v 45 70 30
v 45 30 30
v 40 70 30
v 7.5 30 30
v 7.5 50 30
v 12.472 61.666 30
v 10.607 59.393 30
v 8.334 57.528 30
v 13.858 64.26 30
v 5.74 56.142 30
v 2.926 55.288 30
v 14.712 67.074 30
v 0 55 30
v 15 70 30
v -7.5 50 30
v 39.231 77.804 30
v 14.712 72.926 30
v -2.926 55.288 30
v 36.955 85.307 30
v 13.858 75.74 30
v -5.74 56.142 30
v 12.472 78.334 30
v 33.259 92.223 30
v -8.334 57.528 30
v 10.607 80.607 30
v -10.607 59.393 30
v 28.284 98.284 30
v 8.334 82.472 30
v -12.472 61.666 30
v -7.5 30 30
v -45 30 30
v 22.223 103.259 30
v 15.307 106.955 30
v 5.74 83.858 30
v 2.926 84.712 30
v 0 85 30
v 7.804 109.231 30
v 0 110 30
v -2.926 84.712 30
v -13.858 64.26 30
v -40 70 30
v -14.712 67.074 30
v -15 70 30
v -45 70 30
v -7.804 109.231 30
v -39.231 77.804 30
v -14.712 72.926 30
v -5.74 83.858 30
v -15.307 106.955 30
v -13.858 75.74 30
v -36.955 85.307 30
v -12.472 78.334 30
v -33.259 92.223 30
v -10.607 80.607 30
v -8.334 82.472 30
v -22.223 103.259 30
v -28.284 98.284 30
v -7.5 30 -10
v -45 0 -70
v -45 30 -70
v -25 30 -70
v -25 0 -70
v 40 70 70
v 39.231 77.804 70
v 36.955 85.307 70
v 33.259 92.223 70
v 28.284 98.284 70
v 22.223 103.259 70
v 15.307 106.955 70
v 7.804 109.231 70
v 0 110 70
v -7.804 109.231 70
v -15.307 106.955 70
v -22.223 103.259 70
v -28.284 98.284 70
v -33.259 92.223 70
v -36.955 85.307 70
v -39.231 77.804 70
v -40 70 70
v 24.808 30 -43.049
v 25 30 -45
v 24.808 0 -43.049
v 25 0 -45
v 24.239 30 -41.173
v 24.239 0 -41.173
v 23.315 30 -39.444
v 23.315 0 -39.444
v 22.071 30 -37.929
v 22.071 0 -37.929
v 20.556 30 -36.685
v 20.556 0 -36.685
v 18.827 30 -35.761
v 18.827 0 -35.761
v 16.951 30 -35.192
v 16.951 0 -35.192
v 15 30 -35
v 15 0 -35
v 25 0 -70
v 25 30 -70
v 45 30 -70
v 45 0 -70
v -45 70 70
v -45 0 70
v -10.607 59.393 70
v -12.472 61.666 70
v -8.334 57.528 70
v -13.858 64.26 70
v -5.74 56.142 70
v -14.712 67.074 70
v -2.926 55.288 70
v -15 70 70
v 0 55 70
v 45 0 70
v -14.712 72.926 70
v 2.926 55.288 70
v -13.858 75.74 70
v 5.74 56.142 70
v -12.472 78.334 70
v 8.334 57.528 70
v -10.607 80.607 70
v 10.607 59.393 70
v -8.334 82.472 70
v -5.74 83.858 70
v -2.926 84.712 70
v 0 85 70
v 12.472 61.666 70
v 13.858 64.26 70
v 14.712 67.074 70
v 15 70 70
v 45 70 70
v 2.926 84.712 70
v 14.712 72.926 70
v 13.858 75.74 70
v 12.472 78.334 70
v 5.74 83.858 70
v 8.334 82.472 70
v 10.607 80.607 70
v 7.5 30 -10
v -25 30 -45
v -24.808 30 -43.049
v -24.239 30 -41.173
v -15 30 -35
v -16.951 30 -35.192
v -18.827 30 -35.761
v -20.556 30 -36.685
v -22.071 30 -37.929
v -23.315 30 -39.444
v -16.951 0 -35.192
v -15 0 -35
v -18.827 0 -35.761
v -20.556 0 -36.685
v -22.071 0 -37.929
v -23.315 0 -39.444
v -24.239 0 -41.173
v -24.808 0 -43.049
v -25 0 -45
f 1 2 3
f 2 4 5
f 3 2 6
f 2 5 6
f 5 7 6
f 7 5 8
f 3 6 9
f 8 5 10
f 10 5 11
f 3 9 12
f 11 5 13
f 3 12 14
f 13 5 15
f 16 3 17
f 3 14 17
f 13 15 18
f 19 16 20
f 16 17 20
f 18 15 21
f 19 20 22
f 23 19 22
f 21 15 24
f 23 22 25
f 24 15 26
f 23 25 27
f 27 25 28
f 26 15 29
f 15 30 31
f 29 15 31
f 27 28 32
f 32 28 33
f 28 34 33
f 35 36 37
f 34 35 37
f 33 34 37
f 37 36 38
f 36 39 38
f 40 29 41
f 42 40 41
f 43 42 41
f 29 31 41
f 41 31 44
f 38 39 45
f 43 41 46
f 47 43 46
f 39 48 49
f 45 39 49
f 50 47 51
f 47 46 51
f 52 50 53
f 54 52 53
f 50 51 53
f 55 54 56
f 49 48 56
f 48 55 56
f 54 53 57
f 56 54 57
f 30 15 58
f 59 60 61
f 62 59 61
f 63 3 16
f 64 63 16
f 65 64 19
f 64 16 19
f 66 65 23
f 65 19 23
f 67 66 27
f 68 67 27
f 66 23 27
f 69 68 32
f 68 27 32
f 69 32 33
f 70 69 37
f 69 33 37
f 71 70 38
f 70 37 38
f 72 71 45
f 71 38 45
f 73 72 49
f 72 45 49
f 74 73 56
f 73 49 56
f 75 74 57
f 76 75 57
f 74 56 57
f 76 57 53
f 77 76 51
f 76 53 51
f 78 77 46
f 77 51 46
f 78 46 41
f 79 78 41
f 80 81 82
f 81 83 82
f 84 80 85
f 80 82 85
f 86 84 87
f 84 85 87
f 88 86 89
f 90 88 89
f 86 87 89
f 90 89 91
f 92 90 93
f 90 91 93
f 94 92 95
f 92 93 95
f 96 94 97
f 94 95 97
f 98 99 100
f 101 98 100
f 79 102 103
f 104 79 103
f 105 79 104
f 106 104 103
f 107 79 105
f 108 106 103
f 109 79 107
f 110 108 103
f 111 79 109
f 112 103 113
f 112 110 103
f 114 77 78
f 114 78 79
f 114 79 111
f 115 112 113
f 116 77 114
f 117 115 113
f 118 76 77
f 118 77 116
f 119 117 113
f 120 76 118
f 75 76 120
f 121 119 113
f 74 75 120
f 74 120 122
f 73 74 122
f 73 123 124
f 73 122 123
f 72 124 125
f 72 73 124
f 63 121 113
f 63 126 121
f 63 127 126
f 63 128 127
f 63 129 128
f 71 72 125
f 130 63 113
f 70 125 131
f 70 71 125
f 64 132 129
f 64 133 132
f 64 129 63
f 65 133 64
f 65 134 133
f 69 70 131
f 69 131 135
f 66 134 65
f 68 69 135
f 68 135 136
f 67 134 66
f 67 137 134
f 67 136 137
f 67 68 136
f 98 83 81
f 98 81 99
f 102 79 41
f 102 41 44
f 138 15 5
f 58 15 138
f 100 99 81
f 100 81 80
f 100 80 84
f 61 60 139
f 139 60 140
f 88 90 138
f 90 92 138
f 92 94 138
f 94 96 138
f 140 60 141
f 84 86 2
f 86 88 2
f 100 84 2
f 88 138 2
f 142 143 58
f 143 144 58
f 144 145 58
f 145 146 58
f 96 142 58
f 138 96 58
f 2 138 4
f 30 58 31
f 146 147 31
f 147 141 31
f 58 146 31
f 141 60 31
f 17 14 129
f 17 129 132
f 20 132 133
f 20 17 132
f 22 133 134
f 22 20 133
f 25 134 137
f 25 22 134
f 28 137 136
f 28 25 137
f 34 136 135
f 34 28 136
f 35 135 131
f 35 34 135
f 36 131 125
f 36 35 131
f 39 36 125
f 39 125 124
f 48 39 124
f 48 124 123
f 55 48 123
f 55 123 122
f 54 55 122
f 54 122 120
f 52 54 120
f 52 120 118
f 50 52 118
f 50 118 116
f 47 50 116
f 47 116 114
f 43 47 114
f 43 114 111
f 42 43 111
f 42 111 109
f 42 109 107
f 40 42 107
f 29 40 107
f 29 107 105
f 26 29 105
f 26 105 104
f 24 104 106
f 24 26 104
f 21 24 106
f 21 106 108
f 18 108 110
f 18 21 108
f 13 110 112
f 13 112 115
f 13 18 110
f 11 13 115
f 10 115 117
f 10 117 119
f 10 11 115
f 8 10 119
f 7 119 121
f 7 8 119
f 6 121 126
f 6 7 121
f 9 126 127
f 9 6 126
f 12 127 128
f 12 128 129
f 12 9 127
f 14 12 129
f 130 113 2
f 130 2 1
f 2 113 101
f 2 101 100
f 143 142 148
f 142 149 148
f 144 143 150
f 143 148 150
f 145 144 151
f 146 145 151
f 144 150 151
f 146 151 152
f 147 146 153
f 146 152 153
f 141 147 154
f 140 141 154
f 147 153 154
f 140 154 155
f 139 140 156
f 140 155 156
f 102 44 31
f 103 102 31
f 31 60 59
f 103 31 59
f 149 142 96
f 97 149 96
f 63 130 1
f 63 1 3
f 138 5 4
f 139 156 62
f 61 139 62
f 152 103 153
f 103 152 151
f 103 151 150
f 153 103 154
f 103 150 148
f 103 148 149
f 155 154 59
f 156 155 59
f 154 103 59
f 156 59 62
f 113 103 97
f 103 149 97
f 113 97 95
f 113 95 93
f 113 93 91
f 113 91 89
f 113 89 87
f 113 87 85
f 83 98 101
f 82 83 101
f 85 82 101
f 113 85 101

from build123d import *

# Parameters (mm, degrees)
BOSS_EXTRUDE1_DEPTH      = 70
BOSS_EXTRUDE1_DEPTH_BACK = 70
SKETCH1_R                = 15
SKETCH2_W                = 100
SKETCH2_H                = 80
CUT_EXTRUDE1_DEPTH       = 159.429795178
SKETCH3_W                = 50
SKETCH3_H                = 35
CUT_EXTRUDE2_DEPTH       = 116.433963806
FILLET1_R                = 10
RIB1_REACH               = 139.931
SKETCH4_WALL_W           = 322.583644032
SKETCH4_WALL_H           = 15


with BuildPart() as part:
    # Sketch1 → Boss-Extrude1 (new, two sides: drawn at the far end of the back side and taken through both)
    with BuildSketch(Plane.XY.offset(-BOSS_EXTRUDE1_DEPTH_BACK)):
        with BuildLine():
            Line((-40, 70), (-45, 70))
            Line((-45, 70), (-45, 0))
            Line((-45, 0), (45, 0))
            Line((45, 0), (45, 70))
            Line((45, 70), (40, 70))
            ThreePointArc((40, 70), (0, 110), (-40, 70))
        make_face()
        with Locations((0, 70)):
            Circle(SKETCH1_R, mode=Mode.SUBTRACT)
    extrude(amount=BOSS_EXTRUDE1_DEPTH + BOSS_EXTRUDE1_DEPTH_BACK)

    # Sketch2 → Cut-Extrude1 (cut, through all)
    with BuildSketch(Plane.ZY.offset(45)):
        with Locations((-20, 70)):
            Rectangle(SKETCH2_W, SKETCH2_H)
    extrude(amount=-CUT_EXTRUDE1_DEPTH, mode=Mode.SUBTRACT)

    # Sketch3 → Cut-Extrude2 (cut, through all)
    with BuildSketch(Plane(origin=(0, 30, 0), x_dir=(1, 0, 0), z_dir=(0, 1, 0))):
        with Locations((0, 52.5)):
            Rectangle(SKETCH3_W, SKETCH3_H)
    extrude(amount=-CUT_EXTRUDE2_DEPTH, mode=Mode.SUBTRACT)

    # Fillet1
    fillet1_edges = [part.edges().sort_by_distance(p)[0] for p in [
        (-25, 15, -35),
        (25, 15, -35),
    ]]
    fillet(fillet1_edges, radius=FILLET1_R)

    # Sketch4 wall → Rib1 (add, up to next)
    with BuildSketch(Plane(origin=(0, 40, 10), x_dir=(0, -0.4472135955, -0.894427191), z_dir=(0, 0.894427191, -0.4472135955)), mode=Mode.PRIVATE) as rib1_sk1:
        Rectangle(SKETCH4_WALL_W, SKETCH4_WALL_H)
    rib1_tool1 = extrude(rib1_sk1.sketch, amount=-RIB1_REACH, mode=Mode.PRIVATE) - part.part
    add(rib1_tool1.solids().sort_by_distance((0, 40, 10))[0])


solid = part.part
